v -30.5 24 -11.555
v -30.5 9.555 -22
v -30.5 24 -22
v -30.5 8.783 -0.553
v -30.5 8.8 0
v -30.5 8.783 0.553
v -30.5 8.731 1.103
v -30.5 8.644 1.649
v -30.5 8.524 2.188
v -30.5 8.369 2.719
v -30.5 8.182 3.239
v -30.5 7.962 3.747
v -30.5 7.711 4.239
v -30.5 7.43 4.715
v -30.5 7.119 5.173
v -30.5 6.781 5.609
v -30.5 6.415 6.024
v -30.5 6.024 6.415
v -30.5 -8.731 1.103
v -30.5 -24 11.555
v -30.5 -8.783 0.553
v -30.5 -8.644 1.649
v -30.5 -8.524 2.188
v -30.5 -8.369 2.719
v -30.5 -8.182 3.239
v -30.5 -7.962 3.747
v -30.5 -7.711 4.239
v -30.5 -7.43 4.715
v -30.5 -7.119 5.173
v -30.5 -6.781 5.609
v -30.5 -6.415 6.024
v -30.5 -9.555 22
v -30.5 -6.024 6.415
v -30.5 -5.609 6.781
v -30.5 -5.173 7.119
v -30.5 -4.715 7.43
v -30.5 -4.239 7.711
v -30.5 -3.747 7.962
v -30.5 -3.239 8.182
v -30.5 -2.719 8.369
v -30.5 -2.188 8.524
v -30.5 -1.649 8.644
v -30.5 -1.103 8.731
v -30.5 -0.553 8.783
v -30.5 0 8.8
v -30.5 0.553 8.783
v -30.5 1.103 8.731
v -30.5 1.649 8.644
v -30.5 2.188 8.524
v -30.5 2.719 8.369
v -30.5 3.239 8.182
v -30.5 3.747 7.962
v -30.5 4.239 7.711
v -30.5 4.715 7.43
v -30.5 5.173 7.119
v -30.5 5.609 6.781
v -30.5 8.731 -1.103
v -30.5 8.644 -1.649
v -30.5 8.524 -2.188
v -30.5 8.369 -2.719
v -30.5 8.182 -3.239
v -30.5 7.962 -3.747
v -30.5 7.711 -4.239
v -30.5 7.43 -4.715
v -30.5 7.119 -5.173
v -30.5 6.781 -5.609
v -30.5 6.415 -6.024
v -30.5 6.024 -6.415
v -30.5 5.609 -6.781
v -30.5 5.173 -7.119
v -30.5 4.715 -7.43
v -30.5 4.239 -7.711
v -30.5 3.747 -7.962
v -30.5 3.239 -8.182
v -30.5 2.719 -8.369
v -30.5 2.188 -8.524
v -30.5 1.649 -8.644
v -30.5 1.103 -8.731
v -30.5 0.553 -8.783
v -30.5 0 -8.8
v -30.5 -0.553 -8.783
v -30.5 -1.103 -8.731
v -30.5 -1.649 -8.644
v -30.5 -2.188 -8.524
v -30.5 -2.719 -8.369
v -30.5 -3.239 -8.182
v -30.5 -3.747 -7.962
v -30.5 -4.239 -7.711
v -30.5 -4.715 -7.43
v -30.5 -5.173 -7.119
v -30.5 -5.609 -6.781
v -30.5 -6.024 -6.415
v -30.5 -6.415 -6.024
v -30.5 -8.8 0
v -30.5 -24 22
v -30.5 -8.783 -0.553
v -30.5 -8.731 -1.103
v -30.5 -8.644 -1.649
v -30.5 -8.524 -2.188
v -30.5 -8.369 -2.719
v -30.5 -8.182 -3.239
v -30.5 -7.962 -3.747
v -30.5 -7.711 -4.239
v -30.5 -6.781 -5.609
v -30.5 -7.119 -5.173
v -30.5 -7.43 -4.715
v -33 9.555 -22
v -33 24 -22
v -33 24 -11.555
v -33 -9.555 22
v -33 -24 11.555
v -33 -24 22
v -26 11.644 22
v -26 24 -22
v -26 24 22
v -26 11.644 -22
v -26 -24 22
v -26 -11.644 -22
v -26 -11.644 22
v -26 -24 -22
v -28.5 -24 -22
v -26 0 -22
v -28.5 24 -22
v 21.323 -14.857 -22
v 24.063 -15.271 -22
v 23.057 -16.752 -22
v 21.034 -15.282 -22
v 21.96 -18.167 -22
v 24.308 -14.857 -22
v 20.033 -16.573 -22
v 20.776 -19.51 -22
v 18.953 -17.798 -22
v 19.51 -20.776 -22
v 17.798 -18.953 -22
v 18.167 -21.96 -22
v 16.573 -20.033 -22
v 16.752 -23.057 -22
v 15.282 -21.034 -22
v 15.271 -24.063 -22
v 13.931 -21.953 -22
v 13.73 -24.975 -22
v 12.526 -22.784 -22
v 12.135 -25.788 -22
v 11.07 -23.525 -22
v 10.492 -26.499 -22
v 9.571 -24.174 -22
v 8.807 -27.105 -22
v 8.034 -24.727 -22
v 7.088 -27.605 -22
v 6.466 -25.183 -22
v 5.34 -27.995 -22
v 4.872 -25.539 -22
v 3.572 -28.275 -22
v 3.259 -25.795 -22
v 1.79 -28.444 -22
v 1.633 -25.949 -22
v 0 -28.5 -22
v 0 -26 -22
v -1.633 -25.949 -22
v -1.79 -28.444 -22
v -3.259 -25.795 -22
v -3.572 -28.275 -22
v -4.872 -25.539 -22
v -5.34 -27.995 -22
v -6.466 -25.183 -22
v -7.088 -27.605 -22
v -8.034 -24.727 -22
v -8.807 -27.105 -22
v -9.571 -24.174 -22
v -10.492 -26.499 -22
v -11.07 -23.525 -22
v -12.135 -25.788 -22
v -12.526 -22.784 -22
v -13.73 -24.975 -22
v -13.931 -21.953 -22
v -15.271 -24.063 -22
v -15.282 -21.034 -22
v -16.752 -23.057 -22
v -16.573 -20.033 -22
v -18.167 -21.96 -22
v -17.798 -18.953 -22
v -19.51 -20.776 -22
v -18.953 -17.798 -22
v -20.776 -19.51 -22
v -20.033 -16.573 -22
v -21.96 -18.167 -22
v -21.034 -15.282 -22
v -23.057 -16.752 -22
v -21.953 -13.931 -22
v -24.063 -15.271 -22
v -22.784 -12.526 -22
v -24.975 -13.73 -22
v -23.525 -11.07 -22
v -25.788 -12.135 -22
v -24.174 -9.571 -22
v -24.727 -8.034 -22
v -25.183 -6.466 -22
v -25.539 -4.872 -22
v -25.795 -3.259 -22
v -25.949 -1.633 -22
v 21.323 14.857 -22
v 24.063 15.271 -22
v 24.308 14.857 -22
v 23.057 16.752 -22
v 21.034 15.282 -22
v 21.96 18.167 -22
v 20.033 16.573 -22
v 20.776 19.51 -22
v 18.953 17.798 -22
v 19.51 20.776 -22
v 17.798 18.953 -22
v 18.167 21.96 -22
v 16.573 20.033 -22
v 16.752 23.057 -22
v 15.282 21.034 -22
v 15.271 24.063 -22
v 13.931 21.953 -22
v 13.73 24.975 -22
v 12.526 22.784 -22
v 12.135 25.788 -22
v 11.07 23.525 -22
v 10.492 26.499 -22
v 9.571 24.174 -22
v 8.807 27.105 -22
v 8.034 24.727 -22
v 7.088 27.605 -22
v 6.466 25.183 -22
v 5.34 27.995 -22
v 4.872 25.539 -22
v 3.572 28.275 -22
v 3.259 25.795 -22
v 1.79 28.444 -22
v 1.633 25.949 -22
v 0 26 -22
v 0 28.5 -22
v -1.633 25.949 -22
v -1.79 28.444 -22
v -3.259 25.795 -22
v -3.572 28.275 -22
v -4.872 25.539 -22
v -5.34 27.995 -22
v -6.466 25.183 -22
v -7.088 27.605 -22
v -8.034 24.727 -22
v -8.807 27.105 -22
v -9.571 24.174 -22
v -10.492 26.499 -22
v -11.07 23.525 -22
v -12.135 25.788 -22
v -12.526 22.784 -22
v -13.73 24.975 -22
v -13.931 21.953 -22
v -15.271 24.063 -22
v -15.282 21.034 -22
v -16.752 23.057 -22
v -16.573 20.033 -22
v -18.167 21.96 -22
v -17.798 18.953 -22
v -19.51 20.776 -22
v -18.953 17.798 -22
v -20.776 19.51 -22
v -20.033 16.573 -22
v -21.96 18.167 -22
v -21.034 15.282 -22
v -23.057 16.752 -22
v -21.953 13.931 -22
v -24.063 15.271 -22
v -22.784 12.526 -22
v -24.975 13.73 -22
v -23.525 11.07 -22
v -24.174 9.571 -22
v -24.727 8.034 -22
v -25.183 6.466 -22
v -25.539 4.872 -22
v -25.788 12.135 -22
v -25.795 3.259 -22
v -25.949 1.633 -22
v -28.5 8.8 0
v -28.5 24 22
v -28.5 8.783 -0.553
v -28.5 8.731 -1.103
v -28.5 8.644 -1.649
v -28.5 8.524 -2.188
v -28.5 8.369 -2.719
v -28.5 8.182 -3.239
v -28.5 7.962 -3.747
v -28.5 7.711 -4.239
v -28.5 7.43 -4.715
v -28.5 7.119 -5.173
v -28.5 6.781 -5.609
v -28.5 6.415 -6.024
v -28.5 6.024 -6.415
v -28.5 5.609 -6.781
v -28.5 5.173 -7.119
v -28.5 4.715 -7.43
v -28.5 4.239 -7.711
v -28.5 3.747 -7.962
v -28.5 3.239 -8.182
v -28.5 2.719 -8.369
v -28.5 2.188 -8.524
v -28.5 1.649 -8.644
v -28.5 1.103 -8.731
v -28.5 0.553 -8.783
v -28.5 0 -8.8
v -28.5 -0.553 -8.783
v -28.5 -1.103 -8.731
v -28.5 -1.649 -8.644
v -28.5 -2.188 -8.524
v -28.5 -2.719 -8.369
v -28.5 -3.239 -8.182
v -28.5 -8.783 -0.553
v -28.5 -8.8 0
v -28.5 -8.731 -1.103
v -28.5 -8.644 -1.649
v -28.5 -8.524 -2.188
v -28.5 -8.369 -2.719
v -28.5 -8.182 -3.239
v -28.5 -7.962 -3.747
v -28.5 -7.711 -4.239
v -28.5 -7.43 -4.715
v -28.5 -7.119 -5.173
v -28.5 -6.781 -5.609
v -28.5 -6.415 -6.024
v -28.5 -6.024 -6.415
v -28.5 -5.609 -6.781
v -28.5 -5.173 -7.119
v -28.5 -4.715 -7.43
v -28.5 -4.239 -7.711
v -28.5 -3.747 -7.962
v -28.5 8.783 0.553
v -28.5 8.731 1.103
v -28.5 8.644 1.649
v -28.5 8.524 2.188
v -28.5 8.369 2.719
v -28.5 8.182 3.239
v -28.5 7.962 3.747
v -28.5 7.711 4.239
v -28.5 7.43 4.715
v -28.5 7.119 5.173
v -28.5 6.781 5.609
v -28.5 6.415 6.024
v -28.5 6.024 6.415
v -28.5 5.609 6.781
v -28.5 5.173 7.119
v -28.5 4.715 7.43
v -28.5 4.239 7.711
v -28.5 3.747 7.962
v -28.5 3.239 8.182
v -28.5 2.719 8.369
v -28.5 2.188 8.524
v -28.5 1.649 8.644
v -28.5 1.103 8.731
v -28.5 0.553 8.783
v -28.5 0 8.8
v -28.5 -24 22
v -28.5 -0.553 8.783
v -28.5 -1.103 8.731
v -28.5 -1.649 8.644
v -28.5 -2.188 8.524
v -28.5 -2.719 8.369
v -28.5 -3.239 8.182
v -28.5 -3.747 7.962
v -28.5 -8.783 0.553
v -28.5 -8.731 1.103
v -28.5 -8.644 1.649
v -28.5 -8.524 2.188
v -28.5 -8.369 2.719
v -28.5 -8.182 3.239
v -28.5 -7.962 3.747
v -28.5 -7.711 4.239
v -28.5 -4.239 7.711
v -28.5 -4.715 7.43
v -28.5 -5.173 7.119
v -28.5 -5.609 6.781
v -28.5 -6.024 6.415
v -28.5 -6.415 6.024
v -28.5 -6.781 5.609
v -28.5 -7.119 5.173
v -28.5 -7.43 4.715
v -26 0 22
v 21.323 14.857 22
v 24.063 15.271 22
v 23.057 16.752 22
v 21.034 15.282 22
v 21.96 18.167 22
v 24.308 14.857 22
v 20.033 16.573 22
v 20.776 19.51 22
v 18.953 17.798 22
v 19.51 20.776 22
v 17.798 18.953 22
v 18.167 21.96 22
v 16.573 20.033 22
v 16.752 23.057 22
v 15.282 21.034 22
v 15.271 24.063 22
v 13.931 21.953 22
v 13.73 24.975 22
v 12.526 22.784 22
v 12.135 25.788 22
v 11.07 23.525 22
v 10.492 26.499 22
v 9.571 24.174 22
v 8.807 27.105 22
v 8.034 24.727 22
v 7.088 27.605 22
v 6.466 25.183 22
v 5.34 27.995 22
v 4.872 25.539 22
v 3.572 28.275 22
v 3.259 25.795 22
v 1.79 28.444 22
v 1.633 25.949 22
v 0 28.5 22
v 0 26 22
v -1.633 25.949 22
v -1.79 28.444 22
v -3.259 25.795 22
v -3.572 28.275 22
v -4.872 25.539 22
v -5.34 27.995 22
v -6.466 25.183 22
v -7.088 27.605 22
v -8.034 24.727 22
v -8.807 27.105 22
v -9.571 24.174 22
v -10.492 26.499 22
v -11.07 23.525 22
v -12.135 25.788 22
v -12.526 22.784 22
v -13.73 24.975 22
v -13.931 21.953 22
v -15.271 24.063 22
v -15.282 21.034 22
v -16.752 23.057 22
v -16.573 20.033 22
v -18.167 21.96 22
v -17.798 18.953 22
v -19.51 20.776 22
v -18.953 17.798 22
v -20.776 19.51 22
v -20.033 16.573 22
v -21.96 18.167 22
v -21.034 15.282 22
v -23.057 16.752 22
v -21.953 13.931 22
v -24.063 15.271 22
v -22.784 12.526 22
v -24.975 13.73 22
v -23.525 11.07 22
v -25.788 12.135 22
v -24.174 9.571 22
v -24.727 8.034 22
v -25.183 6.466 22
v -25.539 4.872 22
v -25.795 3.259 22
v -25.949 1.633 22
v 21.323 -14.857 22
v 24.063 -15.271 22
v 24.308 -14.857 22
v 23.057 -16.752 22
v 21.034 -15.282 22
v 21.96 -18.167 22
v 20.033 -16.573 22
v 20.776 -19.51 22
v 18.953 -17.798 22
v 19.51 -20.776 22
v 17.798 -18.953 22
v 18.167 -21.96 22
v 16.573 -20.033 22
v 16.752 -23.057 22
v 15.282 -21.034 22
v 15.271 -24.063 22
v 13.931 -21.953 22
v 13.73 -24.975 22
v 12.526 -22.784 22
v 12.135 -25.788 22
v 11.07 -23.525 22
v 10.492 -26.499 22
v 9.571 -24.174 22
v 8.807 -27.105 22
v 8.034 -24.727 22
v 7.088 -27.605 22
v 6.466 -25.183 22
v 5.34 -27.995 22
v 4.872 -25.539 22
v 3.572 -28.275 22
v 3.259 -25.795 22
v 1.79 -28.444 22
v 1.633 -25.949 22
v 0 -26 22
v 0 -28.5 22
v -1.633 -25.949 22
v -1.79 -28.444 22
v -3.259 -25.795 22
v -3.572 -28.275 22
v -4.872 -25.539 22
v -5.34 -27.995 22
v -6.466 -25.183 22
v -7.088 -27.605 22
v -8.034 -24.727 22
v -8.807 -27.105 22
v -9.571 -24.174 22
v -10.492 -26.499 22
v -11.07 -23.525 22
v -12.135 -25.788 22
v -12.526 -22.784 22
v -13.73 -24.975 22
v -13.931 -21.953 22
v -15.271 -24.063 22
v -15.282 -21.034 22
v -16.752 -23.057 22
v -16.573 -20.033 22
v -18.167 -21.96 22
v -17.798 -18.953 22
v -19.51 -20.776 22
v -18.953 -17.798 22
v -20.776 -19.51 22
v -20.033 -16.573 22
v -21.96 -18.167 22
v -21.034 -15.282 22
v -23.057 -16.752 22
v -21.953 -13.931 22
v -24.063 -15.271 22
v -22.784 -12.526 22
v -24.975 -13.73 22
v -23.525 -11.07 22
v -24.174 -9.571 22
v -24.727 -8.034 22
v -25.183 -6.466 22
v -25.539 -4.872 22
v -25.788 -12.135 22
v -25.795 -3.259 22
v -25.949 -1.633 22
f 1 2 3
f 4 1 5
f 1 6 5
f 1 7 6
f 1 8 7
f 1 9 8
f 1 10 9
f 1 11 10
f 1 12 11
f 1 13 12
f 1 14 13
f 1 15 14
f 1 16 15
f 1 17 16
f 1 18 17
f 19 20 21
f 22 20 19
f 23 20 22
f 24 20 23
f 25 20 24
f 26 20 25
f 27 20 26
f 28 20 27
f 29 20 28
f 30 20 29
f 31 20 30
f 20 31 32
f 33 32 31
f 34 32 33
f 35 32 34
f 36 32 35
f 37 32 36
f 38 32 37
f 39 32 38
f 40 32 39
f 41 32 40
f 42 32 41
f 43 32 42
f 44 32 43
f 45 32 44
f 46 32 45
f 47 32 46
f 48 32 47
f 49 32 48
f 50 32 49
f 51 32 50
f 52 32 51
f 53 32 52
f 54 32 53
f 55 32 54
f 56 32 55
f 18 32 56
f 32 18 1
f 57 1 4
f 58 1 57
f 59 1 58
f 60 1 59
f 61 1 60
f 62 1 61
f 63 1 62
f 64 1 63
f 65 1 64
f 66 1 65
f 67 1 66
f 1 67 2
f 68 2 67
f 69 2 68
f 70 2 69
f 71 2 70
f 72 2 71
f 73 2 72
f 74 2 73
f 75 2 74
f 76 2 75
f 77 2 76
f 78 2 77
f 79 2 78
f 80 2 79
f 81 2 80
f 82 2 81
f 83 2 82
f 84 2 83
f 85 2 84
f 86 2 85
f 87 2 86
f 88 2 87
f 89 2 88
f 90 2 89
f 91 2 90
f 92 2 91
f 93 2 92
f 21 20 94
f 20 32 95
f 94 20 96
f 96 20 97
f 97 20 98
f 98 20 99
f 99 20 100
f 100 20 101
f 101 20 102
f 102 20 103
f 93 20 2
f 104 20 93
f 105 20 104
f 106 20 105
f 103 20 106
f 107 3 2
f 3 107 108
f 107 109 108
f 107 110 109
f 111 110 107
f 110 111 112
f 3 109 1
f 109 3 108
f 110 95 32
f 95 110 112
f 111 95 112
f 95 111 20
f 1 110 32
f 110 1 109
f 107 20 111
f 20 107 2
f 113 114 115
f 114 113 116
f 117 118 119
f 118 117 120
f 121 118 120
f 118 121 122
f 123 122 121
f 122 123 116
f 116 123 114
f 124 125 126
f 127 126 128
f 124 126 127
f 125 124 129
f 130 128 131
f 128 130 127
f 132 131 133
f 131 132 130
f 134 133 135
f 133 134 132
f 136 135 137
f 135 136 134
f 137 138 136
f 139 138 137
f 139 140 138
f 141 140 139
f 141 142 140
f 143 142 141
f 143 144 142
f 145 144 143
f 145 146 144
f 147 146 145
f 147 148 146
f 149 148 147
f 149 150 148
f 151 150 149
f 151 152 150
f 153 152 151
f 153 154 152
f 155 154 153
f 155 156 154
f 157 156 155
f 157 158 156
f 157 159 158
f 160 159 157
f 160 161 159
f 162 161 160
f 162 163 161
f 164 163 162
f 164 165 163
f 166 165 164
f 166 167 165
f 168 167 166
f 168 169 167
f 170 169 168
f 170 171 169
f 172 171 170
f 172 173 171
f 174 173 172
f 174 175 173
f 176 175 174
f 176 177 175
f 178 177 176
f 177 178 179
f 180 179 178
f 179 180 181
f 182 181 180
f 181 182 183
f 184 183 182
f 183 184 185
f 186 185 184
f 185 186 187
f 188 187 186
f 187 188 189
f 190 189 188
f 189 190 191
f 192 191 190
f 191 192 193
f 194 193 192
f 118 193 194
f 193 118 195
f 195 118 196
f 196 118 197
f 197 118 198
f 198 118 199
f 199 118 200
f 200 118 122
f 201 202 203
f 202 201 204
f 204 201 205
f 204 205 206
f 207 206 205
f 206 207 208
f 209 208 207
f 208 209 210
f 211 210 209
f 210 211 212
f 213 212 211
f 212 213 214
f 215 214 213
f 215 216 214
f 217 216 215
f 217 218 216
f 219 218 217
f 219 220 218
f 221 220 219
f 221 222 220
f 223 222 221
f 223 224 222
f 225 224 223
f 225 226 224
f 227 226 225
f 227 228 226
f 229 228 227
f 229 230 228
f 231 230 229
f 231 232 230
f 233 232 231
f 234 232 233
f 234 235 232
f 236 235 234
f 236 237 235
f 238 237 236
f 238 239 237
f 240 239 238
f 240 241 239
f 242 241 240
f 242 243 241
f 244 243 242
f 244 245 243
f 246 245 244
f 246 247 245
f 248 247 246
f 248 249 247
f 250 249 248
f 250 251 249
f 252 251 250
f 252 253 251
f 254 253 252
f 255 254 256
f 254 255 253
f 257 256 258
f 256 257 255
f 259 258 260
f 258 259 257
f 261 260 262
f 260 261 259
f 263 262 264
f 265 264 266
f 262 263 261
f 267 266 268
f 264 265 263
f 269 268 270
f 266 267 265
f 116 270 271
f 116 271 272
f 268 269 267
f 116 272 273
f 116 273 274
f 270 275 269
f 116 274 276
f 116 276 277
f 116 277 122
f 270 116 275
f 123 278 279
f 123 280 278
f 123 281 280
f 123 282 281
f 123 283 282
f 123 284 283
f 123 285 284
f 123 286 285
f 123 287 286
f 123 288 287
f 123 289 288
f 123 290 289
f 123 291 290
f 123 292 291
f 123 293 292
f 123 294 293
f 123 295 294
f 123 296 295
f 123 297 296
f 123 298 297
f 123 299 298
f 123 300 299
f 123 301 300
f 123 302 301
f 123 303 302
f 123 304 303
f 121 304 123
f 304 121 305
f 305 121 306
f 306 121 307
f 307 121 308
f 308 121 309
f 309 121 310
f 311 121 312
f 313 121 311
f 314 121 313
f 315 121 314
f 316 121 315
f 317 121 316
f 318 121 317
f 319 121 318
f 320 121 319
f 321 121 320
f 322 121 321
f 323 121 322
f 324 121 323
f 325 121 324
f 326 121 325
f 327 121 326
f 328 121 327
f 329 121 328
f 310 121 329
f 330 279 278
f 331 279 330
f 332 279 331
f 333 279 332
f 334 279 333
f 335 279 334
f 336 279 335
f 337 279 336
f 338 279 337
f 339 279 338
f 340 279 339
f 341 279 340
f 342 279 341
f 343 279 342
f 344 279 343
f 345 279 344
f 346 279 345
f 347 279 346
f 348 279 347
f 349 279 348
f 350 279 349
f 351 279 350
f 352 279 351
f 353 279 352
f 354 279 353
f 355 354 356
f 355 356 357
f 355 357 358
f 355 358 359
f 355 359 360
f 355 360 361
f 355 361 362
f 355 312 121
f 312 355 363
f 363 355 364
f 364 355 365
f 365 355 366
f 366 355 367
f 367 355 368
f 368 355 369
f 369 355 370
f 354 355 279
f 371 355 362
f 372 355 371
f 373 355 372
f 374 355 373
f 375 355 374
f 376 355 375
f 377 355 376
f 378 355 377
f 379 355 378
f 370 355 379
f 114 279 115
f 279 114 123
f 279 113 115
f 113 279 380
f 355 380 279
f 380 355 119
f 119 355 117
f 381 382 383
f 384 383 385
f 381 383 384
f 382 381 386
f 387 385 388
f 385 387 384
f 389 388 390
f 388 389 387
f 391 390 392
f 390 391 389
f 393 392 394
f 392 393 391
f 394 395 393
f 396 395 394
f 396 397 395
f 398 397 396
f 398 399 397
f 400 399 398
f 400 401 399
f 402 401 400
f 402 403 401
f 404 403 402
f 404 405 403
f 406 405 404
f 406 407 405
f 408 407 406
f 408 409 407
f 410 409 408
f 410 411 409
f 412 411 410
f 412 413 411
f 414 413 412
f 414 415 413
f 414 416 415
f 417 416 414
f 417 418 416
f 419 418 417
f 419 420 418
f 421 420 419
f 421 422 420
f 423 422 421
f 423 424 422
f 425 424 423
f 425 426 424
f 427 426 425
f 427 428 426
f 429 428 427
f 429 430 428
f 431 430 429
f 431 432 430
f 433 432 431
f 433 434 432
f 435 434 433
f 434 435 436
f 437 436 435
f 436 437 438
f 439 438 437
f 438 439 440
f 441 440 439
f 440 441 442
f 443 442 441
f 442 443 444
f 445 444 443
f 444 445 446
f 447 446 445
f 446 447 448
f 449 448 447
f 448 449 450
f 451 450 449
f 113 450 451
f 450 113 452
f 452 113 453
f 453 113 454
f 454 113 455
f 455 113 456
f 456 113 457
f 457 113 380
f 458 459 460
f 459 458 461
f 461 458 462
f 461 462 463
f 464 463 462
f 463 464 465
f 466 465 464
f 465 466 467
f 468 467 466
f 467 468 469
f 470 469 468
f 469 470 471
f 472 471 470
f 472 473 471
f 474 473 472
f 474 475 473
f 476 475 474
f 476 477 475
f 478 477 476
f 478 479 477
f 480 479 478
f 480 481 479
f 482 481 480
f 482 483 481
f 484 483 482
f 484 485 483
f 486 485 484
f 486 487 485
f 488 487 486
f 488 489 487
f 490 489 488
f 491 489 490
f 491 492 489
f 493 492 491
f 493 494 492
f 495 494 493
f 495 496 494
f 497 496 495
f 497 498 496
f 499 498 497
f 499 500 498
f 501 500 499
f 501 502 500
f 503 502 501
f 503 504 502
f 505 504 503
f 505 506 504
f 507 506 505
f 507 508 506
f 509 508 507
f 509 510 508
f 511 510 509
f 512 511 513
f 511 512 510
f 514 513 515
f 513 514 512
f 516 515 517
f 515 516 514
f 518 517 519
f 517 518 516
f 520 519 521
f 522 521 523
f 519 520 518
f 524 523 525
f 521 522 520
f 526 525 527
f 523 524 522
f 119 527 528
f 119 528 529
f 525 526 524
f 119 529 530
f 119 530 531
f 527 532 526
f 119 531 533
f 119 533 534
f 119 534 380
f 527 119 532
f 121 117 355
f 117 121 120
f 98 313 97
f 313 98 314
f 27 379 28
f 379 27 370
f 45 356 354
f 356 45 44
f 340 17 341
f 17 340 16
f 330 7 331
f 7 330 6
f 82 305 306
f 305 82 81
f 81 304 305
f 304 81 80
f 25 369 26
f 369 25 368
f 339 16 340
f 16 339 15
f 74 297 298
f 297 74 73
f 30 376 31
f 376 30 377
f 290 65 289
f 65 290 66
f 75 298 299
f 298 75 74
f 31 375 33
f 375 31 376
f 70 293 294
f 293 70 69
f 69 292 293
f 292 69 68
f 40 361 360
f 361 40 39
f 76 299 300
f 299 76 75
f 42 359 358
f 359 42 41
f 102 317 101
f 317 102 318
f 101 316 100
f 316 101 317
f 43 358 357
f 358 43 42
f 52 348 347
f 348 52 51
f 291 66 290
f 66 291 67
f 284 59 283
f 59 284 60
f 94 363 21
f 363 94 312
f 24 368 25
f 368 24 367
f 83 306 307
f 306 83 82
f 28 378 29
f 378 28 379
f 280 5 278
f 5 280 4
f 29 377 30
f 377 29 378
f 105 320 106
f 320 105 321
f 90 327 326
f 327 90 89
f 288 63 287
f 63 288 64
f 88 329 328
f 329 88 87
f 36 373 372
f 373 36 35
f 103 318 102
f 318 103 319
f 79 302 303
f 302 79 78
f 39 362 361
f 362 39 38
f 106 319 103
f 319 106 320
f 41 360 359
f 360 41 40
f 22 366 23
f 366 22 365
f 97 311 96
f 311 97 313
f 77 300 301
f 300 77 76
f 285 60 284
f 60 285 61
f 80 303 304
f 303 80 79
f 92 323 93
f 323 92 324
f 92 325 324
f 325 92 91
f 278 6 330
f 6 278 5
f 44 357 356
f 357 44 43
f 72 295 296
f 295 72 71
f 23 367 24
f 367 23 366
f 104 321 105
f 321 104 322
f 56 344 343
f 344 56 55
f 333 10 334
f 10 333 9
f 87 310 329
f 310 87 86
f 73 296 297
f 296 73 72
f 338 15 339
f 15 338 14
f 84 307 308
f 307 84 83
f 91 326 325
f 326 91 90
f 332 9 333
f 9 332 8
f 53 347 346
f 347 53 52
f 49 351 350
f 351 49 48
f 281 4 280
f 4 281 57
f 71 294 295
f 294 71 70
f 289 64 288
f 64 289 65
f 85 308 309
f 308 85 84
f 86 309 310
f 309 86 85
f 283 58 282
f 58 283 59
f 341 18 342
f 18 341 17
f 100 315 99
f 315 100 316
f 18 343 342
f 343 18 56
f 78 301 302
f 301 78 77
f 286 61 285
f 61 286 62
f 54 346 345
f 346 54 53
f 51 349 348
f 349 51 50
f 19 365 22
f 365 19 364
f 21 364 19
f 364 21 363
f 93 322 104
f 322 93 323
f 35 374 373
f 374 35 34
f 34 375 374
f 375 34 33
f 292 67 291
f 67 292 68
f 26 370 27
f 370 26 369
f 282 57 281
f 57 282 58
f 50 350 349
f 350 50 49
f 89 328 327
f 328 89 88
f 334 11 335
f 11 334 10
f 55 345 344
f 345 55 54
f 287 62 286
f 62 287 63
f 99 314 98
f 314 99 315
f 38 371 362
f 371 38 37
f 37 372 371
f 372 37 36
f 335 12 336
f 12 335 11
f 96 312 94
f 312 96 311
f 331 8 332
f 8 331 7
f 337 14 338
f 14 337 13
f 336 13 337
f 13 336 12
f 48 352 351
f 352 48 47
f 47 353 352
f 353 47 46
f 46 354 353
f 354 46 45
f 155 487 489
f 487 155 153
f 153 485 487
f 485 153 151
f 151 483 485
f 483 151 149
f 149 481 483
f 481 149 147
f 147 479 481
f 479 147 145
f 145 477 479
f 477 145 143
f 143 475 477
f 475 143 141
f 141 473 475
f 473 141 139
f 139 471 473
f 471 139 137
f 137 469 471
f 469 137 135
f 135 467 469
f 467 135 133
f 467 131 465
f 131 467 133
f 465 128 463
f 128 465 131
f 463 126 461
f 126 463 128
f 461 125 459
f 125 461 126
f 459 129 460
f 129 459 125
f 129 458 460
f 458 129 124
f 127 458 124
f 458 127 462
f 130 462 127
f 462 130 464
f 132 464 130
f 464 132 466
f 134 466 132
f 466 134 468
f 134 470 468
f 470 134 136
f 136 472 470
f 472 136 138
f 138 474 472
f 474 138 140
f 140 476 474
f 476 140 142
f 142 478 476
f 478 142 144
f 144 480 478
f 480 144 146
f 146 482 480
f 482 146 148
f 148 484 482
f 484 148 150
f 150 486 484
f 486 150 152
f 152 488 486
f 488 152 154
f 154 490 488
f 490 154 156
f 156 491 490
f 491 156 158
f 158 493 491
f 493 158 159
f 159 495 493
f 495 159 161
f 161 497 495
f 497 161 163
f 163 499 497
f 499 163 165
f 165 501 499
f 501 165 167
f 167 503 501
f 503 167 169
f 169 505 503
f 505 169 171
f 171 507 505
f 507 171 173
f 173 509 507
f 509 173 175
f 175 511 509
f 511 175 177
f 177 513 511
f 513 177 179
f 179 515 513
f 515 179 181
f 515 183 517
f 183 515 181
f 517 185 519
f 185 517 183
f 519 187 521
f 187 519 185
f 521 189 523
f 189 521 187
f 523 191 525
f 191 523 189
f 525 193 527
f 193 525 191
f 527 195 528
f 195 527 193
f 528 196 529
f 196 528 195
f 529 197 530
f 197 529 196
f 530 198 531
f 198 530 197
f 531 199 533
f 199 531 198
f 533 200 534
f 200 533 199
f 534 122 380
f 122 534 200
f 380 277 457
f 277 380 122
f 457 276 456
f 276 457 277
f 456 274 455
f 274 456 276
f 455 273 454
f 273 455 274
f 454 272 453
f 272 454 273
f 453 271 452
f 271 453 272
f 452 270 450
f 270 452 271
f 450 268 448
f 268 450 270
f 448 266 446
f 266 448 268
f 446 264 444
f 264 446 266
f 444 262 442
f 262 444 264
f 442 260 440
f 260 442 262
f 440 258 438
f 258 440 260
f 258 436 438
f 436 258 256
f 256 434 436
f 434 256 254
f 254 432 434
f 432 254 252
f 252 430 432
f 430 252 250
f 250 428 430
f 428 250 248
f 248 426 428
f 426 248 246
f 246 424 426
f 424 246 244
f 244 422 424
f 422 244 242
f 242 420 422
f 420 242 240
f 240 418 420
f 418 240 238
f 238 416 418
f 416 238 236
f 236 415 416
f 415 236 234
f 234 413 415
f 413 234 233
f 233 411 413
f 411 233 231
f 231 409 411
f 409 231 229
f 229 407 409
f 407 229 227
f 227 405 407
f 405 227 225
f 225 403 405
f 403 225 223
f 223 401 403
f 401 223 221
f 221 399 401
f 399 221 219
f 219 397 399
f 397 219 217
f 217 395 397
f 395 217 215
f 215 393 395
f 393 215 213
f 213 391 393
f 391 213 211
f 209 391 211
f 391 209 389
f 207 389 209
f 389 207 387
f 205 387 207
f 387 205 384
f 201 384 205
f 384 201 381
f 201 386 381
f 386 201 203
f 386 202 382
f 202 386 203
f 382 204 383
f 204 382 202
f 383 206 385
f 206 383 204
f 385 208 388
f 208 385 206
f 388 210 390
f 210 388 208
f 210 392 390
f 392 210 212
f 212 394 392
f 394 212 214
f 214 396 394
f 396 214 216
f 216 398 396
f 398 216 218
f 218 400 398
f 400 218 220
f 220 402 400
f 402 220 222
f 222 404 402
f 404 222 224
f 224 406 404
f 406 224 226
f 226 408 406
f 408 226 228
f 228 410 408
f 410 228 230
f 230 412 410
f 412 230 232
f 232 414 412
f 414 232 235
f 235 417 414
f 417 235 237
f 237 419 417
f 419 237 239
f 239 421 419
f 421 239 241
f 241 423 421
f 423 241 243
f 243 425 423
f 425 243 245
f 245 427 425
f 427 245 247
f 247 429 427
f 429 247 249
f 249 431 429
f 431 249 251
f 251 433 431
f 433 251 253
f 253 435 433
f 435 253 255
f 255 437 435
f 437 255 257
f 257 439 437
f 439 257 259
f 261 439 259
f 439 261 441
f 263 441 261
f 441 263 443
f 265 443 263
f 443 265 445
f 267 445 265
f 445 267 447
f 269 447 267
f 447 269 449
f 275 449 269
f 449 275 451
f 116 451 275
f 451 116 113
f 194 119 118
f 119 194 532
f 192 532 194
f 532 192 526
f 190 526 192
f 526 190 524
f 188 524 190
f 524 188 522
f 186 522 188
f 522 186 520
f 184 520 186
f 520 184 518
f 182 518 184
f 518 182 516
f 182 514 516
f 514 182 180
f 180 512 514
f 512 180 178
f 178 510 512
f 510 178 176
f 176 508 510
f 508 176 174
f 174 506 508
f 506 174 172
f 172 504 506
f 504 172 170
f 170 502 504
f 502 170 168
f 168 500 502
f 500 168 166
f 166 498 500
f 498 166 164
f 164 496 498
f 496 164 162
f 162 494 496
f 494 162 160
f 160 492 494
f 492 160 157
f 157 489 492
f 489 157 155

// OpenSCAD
bottle_diam = 52;
bottle_flat = 52;

holder_z = 44;
holder_y = 48;

cage_bar_diam = 2;
cage_bar_spacing = 22;

width = 2.5;

Holder_offset = 0;
Holder_angle = 0;


module Bottle () {
    difference() {
        circle(d=bottle_diam,$fn=100);
        translate ([(bottle_diam-bottle_flat)/2 - bottle_diam/2,0,0]) square([(bottle_diam-bottle_flat),bottle_diam],true);
    }
}

module Bootle_Holder () {
    linear_extrude (holder_z/2) difference () {
        circle(d=bottle_diam+width*2,$fn=100);
        Bottle();
        translate ([bottle_diam/2,0,0]) square(bottle_diam/1.75,true);
    }
    
    
}

module Support_Holder () {
    linear_extrude (width) square([holder_z,holder_y],true);
    translate ([0,0,-Holder_offset+width/2]) linear_extrude (width+cage_bar_diam+width/2 + Holder_offset) circle(d=cage_bar_spacing-cage_bar_spacing/5,$fn=100) ;
    translate ([0,0,cage_bar_diam+width]) difference () {
        linear_extrude (width) square([holder_z,holder_y],true);
        linear_extrude (width) rotate ([0,0,45]) translate ([cage_bar_spacing/2-cage_bar_spacing/10+100/2,0,0]) square(100,true);
        linear_extrude (width) rotate ([0,0,45+180]) translate ([cage_bar_spacing/2-cage_bar_spacing/10+100/2,0,0]) square(100,true);
    }
}

module Holder () {
    translate ([Holder_offset,0,0]) rotate ([0,Holder_angle,0]) Bootle_Holder ();
    translate ([Holder_offset,0,0]) rotate ([0,Holder_angle,0]) mirror ([0,0,1]) Bootle_Holder();
    translate ([-bottle_diam/2,0,0]) rotate ([0,-90,0]) Support_Holder();
}

Holder();
